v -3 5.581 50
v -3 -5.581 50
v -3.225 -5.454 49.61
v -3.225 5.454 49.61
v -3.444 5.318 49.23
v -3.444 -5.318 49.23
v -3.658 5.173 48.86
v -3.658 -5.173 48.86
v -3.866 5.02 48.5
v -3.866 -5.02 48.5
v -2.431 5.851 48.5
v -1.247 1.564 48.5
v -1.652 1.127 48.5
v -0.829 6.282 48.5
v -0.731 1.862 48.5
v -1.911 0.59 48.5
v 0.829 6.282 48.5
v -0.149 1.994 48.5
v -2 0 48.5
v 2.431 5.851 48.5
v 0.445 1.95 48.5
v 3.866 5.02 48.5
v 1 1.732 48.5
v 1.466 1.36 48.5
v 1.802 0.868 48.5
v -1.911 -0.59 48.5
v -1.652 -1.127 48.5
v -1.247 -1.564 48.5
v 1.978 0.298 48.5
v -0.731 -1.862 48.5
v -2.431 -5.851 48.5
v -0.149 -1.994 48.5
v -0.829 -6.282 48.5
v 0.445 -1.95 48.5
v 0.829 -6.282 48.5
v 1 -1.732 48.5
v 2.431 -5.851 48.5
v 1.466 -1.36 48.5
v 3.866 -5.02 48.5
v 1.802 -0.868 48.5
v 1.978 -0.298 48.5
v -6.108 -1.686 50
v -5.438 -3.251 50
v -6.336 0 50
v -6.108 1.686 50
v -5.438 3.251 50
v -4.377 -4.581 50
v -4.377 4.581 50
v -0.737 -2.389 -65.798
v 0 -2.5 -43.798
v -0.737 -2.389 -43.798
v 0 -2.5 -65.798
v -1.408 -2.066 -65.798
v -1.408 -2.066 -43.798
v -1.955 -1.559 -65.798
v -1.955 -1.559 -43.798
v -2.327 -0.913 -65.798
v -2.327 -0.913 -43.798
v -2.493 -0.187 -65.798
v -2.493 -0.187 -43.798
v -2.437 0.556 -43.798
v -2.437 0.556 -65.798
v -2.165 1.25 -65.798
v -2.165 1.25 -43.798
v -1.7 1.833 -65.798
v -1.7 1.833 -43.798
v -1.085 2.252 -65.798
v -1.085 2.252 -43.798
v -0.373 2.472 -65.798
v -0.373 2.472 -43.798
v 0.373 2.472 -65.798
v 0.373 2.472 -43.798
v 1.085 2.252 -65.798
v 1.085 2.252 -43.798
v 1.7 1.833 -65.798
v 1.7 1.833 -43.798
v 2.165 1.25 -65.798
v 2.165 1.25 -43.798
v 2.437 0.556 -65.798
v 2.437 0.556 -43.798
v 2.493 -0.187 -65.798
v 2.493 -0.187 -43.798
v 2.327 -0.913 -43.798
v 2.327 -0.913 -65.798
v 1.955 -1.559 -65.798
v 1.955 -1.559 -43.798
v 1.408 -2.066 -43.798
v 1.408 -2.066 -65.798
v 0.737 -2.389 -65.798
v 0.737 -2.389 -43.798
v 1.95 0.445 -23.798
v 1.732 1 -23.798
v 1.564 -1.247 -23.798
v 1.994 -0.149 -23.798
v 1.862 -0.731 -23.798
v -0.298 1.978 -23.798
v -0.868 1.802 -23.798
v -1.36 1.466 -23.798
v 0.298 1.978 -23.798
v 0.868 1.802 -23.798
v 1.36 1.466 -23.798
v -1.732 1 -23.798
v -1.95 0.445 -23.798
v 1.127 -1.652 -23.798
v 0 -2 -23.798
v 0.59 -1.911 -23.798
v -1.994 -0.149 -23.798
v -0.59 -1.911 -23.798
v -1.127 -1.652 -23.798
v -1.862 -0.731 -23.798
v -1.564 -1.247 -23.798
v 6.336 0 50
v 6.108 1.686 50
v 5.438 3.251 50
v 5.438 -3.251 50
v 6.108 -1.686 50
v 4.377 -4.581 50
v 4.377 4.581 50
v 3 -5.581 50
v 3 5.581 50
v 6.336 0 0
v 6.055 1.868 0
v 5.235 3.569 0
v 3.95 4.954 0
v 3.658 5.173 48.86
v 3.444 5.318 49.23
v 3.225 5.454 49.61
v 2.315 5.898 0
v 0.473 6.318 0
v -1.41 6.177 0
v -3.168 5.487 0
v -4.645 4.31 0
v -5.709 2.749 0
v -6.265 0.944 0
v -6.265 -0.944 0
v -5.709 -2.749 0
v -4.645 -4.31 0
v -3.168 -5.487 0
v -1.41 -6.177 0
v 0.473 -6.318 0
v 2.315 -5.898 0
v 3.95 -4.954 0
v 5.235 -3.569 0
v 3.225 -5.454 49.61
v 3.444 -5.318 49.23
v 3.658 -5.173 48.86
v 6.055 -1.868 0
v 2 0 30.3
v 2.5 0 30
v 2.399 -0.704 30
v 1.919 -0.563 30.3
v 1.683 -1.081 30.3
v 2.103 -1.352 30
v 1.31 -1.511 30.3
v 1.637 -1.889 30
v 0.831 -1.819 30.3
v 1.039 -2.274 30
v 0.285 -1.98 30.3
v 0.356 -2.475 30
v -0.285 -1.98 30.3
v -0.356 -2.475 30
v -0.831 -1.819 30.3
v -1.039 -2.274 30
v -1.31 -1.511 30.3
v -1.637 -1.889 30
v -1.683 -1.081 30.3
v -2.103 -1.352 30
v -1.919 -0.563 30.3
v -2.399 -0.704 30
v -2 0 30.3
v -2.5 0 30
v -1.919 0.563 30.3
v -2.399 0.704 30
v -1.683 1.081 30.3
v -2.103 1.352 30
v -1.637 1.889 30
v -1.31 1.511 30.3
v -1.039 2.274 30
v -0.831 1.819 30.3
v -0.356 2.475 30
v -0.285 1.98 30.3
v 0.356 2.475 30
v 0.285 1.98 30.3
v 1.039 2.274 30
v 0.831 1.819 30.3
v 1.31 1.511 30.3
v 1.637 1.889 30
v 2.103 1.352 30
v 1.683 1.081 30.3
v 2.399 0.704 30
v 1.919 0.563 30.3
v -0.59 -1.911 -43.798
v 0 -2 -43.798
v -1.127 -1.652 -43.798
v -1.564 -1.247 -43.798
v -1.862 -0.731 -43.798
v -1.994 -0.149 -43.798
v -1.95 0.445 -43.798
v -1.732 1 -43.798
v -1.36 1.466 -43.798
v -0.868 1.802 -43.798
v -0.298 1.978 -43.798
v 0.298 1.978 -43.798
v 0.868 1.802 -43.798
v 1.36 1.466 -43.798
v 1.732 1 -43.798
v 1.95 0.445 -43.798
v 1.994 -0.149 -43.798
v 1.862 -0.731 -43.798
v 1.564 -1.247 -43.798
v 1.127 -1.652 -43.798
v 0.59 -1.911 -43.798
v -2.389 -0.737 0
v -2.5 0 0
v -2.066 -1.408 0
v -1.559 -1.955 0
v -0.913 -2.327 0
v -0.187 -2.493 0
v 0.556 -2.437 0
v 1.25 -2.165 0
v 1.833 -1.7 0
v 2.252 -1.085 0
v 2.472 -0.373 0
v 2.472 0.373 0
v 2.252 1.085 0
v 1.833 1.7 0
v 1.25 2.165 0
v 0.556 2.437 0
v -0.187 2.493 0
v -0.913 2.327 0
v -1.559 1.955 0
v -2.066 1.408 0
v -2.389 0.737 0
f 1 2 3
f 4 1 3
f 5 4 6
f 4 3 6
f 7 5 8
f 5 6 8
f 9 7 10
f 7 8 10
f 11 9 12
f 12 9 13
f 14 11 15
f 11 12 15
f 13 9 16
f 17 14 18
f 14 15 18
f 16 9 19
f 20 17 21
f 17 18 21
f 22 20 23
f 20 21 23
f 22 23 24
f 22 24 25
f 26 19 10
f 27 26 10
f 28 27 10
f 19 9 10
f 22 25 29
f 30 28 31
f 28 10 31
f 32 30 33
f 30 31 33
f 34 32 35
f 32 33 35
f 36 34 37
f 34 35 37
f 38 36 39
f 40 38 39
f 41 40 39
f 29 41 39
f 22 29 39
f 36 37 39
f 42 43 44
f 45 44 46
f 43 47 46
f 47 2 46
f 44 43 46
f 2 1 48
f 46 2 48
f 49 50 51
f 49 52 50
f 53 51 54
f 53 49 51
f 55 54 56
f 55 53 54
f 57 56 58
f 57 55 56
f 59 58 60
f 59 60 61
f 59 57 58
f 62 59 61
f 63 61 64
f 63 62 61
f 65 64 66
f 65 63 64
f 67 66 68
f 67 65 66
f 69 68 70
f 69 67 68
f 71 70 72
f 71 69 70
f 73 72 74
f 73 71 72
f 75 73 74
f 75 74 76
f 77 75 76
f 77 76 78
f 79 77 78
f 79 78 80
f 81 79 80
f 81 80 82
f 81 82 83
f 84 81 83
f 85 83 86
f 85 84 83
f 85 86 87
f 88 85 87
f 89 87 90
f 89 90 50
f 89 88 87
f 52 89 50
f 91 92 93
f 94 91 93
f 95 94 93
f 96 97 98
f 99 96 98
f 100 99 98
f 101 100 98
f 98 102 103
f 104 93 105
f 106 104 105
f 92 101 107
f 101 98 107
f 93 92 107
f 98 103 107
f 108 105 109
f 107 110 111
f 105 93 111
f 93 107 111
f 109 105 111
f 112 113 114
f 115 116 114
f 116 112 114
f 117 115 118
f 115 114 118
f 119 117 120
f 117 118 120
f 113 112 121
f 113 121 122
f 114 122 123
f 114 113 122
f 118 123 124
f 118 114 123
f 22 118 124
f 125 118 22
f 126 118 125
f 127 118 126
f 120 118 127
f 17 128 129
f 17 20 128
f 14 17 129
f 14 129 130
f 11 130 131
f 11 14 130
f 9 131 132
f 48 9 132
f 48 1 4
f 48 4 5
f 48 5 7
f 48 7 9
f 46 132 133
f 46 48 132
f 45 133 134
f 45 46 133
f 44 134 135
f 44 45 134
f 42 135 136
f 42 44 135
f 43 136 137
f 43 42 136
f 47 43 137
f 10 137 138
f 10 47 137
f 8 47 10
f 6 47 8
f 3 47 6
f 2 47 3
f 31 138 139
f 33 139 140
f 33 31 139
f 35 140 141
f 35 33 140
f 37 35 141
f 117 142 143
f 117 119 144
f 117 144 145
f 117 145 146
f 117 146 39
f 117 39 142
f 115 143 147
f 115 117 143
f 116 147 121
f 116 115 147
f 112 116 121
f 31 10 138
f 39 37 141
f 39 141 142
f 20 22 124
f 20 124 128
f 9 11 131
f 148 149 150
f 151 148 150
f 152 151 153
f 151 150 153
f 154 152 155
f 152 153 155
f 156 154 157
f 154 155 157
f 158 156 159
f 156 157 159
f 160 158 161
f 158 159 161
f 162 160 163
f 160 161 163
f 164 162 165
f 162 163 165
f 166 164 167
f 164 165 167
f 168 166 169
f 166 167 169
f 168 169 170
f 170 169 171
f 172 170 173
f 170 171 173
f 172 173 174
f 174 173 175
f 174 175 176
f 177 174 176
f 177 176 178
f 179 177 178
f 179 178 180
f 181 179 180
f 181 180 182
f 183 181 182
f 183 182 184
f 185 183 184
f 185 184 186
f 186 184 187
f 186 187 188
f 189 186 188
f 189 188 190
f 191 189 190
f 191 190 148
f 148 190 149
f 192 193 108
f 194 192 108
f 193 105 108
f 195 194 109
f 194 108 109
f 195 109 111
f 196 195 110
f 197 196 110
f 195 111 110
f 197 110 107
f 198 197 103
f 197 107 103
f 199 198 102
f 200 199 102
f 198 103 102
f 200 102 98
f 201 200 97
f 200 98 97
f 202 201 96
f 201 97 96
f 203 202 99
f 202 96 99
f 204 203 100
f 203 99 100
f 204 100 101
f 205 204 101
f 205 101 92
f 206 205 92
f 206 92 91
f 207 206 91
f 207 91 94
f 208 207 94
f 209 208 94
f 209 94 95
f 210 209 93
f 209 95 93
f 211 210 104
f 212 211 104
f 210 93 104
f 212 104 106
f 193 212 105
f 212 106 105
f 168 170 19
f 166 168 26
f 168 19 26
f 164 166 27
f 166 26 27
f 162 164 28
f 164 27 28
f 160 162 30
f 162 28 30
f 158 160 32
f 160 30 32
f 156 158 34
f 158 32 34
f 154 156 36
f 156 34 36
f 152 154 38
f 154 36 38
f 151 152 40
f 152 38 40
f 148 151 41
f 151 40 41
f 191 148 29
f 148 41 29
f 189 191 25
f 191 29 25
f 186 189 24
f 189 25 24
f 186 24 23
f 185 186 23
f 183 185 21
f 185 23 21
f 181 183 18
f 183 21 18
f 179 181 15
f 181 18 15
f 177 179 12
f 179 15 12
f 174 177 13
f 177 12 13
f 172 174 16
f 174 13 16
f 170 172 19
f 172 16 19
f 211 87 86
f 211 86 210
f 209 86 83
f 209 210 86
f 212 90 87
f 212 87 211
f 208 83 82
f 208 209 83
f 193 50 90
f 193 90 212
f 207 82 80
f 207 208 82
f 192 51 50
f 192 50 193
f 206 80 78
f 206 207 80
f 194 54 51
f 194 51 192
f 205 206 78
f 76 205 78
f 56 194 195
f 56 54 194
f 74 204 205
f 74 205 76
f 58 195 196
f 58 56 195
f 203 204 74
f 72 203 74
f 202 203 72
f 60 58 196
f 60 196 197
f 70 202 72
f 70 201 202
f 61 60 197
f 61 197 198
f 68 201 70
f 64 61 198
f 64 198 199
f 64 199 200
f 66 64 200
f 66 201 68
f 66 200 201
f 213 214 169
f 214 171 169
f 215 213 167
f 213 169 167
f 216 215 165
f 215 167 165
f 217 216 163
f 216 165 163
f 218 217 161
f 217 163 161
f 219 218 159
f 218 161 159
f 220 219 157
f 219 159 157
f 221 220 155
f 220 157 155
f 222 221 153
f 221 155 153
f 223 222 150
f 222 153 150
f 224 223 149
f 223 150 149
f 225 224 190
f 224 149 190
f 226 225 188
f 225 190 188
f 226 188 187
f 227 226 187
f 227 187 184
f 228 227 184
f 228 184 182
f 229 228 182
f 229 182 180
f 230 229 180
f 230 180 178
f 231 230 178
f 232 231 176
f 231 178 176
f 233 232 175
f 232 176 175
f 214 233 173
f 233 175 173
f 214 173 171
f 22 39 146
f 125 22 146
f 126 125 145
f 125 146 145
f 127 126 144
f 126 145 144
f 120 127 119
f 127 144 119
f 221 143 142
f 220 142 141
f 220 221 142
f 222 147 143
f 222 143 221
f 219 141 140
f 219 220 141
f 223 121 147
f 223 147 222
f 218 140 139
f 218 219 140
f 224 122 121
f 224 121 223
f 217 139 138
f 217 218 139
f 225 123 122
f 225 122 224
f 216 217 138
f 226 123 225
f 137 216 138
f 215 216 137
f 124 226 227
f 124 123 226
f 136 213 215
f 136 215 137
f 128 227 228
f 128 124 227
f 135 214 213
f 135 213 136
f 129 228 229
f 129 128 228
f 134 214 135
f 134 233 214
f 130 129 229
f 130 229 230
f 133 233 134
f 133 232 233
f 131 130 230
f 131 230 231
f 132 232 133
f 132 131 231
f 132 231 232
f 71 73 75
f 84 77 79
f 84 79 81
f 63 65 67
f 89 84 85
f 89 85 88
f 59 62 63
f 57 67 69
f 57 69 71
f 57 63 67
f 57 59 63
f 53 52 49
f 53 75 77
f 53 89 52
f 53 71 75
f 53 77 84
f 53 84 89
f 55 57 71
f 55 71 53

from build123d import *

# Parameters (mm, degrees)
F0_W     = 6.3360925007
F0_H     = 50
F3_DEPTH = 12.5
F5_D     = 4
F6_D     = 5
F6_DEPTH = 30
F6_TIP   = 1.5021515476
F7_W     = 2
F7_H     = 20


with BuildPart() as f1:
    # F0 (on Front) → F1 (revolve)
    with BuildSketch(Plane.XZ):
        with Locations((3.1680462503, 25)):
            Rectangle(F0_W, F0_H)
    revolve(axis=Axis((0, 0, 25), (0, 0, 1)))

    # F2 (on Front) → F3 (cut, symmetric)
    with BuildSketch(Plane.XZ):
        Polygon((3, 50), (3, 51.5), (-3, 51.5), (-3, 50), (-3.8660254038, 48.5), (-3, 48.5), (3, 48.5), align=None)
        Polygon((3.8660254038, 48.5), (3, 50), (3, 48.5), align=None)
    extrude(amount=F3_DEPTH, both=True, mode=Mode.SUBTRACT)

    # F5 (through all)
    with Locations(Plane(origin=(0, 0, 0), x_dir=(1, 0, 0), z_dir=(0, 0, -1))):
        with Locations((0, 0)):
            Hole(F5_D / 2)

    # F6
    with Locations(Plane(origin=(0, 0, 0), x_dir=(1, 0, 0), z_dir=(0, 0, -1))):
        with Locations((0, 0)):
            Hole(F6_D / 2, depth=F6_DEPTH)
            with Locations((0, 0, -(F6_DEPTH + F6_TIP / 2))):  # 118° drill point
                Cone(0, F6_D / 2, F6_TIP, mode=Mode.SUBTRACT)


with BuildPart() as f8:
    # F7 (on Right) → F8 (revolve)
    with BuildSketch(Plane.YZ):
        with Locations((-1, -33.7980591059)):
            Rectangle(F7_W, F7_H)
        Polygon((0, -65.7980591059), (0, -43.7980591059), (-2, -43.7980591059), (-2.5, -43.7980591059), (-2.5, -65.7980591059), align=None)
    revolve(axis=Axis((0, 0, -33.7980591059), (0, 0, -1)))


solid = Compound([f1.part, f8.part])
